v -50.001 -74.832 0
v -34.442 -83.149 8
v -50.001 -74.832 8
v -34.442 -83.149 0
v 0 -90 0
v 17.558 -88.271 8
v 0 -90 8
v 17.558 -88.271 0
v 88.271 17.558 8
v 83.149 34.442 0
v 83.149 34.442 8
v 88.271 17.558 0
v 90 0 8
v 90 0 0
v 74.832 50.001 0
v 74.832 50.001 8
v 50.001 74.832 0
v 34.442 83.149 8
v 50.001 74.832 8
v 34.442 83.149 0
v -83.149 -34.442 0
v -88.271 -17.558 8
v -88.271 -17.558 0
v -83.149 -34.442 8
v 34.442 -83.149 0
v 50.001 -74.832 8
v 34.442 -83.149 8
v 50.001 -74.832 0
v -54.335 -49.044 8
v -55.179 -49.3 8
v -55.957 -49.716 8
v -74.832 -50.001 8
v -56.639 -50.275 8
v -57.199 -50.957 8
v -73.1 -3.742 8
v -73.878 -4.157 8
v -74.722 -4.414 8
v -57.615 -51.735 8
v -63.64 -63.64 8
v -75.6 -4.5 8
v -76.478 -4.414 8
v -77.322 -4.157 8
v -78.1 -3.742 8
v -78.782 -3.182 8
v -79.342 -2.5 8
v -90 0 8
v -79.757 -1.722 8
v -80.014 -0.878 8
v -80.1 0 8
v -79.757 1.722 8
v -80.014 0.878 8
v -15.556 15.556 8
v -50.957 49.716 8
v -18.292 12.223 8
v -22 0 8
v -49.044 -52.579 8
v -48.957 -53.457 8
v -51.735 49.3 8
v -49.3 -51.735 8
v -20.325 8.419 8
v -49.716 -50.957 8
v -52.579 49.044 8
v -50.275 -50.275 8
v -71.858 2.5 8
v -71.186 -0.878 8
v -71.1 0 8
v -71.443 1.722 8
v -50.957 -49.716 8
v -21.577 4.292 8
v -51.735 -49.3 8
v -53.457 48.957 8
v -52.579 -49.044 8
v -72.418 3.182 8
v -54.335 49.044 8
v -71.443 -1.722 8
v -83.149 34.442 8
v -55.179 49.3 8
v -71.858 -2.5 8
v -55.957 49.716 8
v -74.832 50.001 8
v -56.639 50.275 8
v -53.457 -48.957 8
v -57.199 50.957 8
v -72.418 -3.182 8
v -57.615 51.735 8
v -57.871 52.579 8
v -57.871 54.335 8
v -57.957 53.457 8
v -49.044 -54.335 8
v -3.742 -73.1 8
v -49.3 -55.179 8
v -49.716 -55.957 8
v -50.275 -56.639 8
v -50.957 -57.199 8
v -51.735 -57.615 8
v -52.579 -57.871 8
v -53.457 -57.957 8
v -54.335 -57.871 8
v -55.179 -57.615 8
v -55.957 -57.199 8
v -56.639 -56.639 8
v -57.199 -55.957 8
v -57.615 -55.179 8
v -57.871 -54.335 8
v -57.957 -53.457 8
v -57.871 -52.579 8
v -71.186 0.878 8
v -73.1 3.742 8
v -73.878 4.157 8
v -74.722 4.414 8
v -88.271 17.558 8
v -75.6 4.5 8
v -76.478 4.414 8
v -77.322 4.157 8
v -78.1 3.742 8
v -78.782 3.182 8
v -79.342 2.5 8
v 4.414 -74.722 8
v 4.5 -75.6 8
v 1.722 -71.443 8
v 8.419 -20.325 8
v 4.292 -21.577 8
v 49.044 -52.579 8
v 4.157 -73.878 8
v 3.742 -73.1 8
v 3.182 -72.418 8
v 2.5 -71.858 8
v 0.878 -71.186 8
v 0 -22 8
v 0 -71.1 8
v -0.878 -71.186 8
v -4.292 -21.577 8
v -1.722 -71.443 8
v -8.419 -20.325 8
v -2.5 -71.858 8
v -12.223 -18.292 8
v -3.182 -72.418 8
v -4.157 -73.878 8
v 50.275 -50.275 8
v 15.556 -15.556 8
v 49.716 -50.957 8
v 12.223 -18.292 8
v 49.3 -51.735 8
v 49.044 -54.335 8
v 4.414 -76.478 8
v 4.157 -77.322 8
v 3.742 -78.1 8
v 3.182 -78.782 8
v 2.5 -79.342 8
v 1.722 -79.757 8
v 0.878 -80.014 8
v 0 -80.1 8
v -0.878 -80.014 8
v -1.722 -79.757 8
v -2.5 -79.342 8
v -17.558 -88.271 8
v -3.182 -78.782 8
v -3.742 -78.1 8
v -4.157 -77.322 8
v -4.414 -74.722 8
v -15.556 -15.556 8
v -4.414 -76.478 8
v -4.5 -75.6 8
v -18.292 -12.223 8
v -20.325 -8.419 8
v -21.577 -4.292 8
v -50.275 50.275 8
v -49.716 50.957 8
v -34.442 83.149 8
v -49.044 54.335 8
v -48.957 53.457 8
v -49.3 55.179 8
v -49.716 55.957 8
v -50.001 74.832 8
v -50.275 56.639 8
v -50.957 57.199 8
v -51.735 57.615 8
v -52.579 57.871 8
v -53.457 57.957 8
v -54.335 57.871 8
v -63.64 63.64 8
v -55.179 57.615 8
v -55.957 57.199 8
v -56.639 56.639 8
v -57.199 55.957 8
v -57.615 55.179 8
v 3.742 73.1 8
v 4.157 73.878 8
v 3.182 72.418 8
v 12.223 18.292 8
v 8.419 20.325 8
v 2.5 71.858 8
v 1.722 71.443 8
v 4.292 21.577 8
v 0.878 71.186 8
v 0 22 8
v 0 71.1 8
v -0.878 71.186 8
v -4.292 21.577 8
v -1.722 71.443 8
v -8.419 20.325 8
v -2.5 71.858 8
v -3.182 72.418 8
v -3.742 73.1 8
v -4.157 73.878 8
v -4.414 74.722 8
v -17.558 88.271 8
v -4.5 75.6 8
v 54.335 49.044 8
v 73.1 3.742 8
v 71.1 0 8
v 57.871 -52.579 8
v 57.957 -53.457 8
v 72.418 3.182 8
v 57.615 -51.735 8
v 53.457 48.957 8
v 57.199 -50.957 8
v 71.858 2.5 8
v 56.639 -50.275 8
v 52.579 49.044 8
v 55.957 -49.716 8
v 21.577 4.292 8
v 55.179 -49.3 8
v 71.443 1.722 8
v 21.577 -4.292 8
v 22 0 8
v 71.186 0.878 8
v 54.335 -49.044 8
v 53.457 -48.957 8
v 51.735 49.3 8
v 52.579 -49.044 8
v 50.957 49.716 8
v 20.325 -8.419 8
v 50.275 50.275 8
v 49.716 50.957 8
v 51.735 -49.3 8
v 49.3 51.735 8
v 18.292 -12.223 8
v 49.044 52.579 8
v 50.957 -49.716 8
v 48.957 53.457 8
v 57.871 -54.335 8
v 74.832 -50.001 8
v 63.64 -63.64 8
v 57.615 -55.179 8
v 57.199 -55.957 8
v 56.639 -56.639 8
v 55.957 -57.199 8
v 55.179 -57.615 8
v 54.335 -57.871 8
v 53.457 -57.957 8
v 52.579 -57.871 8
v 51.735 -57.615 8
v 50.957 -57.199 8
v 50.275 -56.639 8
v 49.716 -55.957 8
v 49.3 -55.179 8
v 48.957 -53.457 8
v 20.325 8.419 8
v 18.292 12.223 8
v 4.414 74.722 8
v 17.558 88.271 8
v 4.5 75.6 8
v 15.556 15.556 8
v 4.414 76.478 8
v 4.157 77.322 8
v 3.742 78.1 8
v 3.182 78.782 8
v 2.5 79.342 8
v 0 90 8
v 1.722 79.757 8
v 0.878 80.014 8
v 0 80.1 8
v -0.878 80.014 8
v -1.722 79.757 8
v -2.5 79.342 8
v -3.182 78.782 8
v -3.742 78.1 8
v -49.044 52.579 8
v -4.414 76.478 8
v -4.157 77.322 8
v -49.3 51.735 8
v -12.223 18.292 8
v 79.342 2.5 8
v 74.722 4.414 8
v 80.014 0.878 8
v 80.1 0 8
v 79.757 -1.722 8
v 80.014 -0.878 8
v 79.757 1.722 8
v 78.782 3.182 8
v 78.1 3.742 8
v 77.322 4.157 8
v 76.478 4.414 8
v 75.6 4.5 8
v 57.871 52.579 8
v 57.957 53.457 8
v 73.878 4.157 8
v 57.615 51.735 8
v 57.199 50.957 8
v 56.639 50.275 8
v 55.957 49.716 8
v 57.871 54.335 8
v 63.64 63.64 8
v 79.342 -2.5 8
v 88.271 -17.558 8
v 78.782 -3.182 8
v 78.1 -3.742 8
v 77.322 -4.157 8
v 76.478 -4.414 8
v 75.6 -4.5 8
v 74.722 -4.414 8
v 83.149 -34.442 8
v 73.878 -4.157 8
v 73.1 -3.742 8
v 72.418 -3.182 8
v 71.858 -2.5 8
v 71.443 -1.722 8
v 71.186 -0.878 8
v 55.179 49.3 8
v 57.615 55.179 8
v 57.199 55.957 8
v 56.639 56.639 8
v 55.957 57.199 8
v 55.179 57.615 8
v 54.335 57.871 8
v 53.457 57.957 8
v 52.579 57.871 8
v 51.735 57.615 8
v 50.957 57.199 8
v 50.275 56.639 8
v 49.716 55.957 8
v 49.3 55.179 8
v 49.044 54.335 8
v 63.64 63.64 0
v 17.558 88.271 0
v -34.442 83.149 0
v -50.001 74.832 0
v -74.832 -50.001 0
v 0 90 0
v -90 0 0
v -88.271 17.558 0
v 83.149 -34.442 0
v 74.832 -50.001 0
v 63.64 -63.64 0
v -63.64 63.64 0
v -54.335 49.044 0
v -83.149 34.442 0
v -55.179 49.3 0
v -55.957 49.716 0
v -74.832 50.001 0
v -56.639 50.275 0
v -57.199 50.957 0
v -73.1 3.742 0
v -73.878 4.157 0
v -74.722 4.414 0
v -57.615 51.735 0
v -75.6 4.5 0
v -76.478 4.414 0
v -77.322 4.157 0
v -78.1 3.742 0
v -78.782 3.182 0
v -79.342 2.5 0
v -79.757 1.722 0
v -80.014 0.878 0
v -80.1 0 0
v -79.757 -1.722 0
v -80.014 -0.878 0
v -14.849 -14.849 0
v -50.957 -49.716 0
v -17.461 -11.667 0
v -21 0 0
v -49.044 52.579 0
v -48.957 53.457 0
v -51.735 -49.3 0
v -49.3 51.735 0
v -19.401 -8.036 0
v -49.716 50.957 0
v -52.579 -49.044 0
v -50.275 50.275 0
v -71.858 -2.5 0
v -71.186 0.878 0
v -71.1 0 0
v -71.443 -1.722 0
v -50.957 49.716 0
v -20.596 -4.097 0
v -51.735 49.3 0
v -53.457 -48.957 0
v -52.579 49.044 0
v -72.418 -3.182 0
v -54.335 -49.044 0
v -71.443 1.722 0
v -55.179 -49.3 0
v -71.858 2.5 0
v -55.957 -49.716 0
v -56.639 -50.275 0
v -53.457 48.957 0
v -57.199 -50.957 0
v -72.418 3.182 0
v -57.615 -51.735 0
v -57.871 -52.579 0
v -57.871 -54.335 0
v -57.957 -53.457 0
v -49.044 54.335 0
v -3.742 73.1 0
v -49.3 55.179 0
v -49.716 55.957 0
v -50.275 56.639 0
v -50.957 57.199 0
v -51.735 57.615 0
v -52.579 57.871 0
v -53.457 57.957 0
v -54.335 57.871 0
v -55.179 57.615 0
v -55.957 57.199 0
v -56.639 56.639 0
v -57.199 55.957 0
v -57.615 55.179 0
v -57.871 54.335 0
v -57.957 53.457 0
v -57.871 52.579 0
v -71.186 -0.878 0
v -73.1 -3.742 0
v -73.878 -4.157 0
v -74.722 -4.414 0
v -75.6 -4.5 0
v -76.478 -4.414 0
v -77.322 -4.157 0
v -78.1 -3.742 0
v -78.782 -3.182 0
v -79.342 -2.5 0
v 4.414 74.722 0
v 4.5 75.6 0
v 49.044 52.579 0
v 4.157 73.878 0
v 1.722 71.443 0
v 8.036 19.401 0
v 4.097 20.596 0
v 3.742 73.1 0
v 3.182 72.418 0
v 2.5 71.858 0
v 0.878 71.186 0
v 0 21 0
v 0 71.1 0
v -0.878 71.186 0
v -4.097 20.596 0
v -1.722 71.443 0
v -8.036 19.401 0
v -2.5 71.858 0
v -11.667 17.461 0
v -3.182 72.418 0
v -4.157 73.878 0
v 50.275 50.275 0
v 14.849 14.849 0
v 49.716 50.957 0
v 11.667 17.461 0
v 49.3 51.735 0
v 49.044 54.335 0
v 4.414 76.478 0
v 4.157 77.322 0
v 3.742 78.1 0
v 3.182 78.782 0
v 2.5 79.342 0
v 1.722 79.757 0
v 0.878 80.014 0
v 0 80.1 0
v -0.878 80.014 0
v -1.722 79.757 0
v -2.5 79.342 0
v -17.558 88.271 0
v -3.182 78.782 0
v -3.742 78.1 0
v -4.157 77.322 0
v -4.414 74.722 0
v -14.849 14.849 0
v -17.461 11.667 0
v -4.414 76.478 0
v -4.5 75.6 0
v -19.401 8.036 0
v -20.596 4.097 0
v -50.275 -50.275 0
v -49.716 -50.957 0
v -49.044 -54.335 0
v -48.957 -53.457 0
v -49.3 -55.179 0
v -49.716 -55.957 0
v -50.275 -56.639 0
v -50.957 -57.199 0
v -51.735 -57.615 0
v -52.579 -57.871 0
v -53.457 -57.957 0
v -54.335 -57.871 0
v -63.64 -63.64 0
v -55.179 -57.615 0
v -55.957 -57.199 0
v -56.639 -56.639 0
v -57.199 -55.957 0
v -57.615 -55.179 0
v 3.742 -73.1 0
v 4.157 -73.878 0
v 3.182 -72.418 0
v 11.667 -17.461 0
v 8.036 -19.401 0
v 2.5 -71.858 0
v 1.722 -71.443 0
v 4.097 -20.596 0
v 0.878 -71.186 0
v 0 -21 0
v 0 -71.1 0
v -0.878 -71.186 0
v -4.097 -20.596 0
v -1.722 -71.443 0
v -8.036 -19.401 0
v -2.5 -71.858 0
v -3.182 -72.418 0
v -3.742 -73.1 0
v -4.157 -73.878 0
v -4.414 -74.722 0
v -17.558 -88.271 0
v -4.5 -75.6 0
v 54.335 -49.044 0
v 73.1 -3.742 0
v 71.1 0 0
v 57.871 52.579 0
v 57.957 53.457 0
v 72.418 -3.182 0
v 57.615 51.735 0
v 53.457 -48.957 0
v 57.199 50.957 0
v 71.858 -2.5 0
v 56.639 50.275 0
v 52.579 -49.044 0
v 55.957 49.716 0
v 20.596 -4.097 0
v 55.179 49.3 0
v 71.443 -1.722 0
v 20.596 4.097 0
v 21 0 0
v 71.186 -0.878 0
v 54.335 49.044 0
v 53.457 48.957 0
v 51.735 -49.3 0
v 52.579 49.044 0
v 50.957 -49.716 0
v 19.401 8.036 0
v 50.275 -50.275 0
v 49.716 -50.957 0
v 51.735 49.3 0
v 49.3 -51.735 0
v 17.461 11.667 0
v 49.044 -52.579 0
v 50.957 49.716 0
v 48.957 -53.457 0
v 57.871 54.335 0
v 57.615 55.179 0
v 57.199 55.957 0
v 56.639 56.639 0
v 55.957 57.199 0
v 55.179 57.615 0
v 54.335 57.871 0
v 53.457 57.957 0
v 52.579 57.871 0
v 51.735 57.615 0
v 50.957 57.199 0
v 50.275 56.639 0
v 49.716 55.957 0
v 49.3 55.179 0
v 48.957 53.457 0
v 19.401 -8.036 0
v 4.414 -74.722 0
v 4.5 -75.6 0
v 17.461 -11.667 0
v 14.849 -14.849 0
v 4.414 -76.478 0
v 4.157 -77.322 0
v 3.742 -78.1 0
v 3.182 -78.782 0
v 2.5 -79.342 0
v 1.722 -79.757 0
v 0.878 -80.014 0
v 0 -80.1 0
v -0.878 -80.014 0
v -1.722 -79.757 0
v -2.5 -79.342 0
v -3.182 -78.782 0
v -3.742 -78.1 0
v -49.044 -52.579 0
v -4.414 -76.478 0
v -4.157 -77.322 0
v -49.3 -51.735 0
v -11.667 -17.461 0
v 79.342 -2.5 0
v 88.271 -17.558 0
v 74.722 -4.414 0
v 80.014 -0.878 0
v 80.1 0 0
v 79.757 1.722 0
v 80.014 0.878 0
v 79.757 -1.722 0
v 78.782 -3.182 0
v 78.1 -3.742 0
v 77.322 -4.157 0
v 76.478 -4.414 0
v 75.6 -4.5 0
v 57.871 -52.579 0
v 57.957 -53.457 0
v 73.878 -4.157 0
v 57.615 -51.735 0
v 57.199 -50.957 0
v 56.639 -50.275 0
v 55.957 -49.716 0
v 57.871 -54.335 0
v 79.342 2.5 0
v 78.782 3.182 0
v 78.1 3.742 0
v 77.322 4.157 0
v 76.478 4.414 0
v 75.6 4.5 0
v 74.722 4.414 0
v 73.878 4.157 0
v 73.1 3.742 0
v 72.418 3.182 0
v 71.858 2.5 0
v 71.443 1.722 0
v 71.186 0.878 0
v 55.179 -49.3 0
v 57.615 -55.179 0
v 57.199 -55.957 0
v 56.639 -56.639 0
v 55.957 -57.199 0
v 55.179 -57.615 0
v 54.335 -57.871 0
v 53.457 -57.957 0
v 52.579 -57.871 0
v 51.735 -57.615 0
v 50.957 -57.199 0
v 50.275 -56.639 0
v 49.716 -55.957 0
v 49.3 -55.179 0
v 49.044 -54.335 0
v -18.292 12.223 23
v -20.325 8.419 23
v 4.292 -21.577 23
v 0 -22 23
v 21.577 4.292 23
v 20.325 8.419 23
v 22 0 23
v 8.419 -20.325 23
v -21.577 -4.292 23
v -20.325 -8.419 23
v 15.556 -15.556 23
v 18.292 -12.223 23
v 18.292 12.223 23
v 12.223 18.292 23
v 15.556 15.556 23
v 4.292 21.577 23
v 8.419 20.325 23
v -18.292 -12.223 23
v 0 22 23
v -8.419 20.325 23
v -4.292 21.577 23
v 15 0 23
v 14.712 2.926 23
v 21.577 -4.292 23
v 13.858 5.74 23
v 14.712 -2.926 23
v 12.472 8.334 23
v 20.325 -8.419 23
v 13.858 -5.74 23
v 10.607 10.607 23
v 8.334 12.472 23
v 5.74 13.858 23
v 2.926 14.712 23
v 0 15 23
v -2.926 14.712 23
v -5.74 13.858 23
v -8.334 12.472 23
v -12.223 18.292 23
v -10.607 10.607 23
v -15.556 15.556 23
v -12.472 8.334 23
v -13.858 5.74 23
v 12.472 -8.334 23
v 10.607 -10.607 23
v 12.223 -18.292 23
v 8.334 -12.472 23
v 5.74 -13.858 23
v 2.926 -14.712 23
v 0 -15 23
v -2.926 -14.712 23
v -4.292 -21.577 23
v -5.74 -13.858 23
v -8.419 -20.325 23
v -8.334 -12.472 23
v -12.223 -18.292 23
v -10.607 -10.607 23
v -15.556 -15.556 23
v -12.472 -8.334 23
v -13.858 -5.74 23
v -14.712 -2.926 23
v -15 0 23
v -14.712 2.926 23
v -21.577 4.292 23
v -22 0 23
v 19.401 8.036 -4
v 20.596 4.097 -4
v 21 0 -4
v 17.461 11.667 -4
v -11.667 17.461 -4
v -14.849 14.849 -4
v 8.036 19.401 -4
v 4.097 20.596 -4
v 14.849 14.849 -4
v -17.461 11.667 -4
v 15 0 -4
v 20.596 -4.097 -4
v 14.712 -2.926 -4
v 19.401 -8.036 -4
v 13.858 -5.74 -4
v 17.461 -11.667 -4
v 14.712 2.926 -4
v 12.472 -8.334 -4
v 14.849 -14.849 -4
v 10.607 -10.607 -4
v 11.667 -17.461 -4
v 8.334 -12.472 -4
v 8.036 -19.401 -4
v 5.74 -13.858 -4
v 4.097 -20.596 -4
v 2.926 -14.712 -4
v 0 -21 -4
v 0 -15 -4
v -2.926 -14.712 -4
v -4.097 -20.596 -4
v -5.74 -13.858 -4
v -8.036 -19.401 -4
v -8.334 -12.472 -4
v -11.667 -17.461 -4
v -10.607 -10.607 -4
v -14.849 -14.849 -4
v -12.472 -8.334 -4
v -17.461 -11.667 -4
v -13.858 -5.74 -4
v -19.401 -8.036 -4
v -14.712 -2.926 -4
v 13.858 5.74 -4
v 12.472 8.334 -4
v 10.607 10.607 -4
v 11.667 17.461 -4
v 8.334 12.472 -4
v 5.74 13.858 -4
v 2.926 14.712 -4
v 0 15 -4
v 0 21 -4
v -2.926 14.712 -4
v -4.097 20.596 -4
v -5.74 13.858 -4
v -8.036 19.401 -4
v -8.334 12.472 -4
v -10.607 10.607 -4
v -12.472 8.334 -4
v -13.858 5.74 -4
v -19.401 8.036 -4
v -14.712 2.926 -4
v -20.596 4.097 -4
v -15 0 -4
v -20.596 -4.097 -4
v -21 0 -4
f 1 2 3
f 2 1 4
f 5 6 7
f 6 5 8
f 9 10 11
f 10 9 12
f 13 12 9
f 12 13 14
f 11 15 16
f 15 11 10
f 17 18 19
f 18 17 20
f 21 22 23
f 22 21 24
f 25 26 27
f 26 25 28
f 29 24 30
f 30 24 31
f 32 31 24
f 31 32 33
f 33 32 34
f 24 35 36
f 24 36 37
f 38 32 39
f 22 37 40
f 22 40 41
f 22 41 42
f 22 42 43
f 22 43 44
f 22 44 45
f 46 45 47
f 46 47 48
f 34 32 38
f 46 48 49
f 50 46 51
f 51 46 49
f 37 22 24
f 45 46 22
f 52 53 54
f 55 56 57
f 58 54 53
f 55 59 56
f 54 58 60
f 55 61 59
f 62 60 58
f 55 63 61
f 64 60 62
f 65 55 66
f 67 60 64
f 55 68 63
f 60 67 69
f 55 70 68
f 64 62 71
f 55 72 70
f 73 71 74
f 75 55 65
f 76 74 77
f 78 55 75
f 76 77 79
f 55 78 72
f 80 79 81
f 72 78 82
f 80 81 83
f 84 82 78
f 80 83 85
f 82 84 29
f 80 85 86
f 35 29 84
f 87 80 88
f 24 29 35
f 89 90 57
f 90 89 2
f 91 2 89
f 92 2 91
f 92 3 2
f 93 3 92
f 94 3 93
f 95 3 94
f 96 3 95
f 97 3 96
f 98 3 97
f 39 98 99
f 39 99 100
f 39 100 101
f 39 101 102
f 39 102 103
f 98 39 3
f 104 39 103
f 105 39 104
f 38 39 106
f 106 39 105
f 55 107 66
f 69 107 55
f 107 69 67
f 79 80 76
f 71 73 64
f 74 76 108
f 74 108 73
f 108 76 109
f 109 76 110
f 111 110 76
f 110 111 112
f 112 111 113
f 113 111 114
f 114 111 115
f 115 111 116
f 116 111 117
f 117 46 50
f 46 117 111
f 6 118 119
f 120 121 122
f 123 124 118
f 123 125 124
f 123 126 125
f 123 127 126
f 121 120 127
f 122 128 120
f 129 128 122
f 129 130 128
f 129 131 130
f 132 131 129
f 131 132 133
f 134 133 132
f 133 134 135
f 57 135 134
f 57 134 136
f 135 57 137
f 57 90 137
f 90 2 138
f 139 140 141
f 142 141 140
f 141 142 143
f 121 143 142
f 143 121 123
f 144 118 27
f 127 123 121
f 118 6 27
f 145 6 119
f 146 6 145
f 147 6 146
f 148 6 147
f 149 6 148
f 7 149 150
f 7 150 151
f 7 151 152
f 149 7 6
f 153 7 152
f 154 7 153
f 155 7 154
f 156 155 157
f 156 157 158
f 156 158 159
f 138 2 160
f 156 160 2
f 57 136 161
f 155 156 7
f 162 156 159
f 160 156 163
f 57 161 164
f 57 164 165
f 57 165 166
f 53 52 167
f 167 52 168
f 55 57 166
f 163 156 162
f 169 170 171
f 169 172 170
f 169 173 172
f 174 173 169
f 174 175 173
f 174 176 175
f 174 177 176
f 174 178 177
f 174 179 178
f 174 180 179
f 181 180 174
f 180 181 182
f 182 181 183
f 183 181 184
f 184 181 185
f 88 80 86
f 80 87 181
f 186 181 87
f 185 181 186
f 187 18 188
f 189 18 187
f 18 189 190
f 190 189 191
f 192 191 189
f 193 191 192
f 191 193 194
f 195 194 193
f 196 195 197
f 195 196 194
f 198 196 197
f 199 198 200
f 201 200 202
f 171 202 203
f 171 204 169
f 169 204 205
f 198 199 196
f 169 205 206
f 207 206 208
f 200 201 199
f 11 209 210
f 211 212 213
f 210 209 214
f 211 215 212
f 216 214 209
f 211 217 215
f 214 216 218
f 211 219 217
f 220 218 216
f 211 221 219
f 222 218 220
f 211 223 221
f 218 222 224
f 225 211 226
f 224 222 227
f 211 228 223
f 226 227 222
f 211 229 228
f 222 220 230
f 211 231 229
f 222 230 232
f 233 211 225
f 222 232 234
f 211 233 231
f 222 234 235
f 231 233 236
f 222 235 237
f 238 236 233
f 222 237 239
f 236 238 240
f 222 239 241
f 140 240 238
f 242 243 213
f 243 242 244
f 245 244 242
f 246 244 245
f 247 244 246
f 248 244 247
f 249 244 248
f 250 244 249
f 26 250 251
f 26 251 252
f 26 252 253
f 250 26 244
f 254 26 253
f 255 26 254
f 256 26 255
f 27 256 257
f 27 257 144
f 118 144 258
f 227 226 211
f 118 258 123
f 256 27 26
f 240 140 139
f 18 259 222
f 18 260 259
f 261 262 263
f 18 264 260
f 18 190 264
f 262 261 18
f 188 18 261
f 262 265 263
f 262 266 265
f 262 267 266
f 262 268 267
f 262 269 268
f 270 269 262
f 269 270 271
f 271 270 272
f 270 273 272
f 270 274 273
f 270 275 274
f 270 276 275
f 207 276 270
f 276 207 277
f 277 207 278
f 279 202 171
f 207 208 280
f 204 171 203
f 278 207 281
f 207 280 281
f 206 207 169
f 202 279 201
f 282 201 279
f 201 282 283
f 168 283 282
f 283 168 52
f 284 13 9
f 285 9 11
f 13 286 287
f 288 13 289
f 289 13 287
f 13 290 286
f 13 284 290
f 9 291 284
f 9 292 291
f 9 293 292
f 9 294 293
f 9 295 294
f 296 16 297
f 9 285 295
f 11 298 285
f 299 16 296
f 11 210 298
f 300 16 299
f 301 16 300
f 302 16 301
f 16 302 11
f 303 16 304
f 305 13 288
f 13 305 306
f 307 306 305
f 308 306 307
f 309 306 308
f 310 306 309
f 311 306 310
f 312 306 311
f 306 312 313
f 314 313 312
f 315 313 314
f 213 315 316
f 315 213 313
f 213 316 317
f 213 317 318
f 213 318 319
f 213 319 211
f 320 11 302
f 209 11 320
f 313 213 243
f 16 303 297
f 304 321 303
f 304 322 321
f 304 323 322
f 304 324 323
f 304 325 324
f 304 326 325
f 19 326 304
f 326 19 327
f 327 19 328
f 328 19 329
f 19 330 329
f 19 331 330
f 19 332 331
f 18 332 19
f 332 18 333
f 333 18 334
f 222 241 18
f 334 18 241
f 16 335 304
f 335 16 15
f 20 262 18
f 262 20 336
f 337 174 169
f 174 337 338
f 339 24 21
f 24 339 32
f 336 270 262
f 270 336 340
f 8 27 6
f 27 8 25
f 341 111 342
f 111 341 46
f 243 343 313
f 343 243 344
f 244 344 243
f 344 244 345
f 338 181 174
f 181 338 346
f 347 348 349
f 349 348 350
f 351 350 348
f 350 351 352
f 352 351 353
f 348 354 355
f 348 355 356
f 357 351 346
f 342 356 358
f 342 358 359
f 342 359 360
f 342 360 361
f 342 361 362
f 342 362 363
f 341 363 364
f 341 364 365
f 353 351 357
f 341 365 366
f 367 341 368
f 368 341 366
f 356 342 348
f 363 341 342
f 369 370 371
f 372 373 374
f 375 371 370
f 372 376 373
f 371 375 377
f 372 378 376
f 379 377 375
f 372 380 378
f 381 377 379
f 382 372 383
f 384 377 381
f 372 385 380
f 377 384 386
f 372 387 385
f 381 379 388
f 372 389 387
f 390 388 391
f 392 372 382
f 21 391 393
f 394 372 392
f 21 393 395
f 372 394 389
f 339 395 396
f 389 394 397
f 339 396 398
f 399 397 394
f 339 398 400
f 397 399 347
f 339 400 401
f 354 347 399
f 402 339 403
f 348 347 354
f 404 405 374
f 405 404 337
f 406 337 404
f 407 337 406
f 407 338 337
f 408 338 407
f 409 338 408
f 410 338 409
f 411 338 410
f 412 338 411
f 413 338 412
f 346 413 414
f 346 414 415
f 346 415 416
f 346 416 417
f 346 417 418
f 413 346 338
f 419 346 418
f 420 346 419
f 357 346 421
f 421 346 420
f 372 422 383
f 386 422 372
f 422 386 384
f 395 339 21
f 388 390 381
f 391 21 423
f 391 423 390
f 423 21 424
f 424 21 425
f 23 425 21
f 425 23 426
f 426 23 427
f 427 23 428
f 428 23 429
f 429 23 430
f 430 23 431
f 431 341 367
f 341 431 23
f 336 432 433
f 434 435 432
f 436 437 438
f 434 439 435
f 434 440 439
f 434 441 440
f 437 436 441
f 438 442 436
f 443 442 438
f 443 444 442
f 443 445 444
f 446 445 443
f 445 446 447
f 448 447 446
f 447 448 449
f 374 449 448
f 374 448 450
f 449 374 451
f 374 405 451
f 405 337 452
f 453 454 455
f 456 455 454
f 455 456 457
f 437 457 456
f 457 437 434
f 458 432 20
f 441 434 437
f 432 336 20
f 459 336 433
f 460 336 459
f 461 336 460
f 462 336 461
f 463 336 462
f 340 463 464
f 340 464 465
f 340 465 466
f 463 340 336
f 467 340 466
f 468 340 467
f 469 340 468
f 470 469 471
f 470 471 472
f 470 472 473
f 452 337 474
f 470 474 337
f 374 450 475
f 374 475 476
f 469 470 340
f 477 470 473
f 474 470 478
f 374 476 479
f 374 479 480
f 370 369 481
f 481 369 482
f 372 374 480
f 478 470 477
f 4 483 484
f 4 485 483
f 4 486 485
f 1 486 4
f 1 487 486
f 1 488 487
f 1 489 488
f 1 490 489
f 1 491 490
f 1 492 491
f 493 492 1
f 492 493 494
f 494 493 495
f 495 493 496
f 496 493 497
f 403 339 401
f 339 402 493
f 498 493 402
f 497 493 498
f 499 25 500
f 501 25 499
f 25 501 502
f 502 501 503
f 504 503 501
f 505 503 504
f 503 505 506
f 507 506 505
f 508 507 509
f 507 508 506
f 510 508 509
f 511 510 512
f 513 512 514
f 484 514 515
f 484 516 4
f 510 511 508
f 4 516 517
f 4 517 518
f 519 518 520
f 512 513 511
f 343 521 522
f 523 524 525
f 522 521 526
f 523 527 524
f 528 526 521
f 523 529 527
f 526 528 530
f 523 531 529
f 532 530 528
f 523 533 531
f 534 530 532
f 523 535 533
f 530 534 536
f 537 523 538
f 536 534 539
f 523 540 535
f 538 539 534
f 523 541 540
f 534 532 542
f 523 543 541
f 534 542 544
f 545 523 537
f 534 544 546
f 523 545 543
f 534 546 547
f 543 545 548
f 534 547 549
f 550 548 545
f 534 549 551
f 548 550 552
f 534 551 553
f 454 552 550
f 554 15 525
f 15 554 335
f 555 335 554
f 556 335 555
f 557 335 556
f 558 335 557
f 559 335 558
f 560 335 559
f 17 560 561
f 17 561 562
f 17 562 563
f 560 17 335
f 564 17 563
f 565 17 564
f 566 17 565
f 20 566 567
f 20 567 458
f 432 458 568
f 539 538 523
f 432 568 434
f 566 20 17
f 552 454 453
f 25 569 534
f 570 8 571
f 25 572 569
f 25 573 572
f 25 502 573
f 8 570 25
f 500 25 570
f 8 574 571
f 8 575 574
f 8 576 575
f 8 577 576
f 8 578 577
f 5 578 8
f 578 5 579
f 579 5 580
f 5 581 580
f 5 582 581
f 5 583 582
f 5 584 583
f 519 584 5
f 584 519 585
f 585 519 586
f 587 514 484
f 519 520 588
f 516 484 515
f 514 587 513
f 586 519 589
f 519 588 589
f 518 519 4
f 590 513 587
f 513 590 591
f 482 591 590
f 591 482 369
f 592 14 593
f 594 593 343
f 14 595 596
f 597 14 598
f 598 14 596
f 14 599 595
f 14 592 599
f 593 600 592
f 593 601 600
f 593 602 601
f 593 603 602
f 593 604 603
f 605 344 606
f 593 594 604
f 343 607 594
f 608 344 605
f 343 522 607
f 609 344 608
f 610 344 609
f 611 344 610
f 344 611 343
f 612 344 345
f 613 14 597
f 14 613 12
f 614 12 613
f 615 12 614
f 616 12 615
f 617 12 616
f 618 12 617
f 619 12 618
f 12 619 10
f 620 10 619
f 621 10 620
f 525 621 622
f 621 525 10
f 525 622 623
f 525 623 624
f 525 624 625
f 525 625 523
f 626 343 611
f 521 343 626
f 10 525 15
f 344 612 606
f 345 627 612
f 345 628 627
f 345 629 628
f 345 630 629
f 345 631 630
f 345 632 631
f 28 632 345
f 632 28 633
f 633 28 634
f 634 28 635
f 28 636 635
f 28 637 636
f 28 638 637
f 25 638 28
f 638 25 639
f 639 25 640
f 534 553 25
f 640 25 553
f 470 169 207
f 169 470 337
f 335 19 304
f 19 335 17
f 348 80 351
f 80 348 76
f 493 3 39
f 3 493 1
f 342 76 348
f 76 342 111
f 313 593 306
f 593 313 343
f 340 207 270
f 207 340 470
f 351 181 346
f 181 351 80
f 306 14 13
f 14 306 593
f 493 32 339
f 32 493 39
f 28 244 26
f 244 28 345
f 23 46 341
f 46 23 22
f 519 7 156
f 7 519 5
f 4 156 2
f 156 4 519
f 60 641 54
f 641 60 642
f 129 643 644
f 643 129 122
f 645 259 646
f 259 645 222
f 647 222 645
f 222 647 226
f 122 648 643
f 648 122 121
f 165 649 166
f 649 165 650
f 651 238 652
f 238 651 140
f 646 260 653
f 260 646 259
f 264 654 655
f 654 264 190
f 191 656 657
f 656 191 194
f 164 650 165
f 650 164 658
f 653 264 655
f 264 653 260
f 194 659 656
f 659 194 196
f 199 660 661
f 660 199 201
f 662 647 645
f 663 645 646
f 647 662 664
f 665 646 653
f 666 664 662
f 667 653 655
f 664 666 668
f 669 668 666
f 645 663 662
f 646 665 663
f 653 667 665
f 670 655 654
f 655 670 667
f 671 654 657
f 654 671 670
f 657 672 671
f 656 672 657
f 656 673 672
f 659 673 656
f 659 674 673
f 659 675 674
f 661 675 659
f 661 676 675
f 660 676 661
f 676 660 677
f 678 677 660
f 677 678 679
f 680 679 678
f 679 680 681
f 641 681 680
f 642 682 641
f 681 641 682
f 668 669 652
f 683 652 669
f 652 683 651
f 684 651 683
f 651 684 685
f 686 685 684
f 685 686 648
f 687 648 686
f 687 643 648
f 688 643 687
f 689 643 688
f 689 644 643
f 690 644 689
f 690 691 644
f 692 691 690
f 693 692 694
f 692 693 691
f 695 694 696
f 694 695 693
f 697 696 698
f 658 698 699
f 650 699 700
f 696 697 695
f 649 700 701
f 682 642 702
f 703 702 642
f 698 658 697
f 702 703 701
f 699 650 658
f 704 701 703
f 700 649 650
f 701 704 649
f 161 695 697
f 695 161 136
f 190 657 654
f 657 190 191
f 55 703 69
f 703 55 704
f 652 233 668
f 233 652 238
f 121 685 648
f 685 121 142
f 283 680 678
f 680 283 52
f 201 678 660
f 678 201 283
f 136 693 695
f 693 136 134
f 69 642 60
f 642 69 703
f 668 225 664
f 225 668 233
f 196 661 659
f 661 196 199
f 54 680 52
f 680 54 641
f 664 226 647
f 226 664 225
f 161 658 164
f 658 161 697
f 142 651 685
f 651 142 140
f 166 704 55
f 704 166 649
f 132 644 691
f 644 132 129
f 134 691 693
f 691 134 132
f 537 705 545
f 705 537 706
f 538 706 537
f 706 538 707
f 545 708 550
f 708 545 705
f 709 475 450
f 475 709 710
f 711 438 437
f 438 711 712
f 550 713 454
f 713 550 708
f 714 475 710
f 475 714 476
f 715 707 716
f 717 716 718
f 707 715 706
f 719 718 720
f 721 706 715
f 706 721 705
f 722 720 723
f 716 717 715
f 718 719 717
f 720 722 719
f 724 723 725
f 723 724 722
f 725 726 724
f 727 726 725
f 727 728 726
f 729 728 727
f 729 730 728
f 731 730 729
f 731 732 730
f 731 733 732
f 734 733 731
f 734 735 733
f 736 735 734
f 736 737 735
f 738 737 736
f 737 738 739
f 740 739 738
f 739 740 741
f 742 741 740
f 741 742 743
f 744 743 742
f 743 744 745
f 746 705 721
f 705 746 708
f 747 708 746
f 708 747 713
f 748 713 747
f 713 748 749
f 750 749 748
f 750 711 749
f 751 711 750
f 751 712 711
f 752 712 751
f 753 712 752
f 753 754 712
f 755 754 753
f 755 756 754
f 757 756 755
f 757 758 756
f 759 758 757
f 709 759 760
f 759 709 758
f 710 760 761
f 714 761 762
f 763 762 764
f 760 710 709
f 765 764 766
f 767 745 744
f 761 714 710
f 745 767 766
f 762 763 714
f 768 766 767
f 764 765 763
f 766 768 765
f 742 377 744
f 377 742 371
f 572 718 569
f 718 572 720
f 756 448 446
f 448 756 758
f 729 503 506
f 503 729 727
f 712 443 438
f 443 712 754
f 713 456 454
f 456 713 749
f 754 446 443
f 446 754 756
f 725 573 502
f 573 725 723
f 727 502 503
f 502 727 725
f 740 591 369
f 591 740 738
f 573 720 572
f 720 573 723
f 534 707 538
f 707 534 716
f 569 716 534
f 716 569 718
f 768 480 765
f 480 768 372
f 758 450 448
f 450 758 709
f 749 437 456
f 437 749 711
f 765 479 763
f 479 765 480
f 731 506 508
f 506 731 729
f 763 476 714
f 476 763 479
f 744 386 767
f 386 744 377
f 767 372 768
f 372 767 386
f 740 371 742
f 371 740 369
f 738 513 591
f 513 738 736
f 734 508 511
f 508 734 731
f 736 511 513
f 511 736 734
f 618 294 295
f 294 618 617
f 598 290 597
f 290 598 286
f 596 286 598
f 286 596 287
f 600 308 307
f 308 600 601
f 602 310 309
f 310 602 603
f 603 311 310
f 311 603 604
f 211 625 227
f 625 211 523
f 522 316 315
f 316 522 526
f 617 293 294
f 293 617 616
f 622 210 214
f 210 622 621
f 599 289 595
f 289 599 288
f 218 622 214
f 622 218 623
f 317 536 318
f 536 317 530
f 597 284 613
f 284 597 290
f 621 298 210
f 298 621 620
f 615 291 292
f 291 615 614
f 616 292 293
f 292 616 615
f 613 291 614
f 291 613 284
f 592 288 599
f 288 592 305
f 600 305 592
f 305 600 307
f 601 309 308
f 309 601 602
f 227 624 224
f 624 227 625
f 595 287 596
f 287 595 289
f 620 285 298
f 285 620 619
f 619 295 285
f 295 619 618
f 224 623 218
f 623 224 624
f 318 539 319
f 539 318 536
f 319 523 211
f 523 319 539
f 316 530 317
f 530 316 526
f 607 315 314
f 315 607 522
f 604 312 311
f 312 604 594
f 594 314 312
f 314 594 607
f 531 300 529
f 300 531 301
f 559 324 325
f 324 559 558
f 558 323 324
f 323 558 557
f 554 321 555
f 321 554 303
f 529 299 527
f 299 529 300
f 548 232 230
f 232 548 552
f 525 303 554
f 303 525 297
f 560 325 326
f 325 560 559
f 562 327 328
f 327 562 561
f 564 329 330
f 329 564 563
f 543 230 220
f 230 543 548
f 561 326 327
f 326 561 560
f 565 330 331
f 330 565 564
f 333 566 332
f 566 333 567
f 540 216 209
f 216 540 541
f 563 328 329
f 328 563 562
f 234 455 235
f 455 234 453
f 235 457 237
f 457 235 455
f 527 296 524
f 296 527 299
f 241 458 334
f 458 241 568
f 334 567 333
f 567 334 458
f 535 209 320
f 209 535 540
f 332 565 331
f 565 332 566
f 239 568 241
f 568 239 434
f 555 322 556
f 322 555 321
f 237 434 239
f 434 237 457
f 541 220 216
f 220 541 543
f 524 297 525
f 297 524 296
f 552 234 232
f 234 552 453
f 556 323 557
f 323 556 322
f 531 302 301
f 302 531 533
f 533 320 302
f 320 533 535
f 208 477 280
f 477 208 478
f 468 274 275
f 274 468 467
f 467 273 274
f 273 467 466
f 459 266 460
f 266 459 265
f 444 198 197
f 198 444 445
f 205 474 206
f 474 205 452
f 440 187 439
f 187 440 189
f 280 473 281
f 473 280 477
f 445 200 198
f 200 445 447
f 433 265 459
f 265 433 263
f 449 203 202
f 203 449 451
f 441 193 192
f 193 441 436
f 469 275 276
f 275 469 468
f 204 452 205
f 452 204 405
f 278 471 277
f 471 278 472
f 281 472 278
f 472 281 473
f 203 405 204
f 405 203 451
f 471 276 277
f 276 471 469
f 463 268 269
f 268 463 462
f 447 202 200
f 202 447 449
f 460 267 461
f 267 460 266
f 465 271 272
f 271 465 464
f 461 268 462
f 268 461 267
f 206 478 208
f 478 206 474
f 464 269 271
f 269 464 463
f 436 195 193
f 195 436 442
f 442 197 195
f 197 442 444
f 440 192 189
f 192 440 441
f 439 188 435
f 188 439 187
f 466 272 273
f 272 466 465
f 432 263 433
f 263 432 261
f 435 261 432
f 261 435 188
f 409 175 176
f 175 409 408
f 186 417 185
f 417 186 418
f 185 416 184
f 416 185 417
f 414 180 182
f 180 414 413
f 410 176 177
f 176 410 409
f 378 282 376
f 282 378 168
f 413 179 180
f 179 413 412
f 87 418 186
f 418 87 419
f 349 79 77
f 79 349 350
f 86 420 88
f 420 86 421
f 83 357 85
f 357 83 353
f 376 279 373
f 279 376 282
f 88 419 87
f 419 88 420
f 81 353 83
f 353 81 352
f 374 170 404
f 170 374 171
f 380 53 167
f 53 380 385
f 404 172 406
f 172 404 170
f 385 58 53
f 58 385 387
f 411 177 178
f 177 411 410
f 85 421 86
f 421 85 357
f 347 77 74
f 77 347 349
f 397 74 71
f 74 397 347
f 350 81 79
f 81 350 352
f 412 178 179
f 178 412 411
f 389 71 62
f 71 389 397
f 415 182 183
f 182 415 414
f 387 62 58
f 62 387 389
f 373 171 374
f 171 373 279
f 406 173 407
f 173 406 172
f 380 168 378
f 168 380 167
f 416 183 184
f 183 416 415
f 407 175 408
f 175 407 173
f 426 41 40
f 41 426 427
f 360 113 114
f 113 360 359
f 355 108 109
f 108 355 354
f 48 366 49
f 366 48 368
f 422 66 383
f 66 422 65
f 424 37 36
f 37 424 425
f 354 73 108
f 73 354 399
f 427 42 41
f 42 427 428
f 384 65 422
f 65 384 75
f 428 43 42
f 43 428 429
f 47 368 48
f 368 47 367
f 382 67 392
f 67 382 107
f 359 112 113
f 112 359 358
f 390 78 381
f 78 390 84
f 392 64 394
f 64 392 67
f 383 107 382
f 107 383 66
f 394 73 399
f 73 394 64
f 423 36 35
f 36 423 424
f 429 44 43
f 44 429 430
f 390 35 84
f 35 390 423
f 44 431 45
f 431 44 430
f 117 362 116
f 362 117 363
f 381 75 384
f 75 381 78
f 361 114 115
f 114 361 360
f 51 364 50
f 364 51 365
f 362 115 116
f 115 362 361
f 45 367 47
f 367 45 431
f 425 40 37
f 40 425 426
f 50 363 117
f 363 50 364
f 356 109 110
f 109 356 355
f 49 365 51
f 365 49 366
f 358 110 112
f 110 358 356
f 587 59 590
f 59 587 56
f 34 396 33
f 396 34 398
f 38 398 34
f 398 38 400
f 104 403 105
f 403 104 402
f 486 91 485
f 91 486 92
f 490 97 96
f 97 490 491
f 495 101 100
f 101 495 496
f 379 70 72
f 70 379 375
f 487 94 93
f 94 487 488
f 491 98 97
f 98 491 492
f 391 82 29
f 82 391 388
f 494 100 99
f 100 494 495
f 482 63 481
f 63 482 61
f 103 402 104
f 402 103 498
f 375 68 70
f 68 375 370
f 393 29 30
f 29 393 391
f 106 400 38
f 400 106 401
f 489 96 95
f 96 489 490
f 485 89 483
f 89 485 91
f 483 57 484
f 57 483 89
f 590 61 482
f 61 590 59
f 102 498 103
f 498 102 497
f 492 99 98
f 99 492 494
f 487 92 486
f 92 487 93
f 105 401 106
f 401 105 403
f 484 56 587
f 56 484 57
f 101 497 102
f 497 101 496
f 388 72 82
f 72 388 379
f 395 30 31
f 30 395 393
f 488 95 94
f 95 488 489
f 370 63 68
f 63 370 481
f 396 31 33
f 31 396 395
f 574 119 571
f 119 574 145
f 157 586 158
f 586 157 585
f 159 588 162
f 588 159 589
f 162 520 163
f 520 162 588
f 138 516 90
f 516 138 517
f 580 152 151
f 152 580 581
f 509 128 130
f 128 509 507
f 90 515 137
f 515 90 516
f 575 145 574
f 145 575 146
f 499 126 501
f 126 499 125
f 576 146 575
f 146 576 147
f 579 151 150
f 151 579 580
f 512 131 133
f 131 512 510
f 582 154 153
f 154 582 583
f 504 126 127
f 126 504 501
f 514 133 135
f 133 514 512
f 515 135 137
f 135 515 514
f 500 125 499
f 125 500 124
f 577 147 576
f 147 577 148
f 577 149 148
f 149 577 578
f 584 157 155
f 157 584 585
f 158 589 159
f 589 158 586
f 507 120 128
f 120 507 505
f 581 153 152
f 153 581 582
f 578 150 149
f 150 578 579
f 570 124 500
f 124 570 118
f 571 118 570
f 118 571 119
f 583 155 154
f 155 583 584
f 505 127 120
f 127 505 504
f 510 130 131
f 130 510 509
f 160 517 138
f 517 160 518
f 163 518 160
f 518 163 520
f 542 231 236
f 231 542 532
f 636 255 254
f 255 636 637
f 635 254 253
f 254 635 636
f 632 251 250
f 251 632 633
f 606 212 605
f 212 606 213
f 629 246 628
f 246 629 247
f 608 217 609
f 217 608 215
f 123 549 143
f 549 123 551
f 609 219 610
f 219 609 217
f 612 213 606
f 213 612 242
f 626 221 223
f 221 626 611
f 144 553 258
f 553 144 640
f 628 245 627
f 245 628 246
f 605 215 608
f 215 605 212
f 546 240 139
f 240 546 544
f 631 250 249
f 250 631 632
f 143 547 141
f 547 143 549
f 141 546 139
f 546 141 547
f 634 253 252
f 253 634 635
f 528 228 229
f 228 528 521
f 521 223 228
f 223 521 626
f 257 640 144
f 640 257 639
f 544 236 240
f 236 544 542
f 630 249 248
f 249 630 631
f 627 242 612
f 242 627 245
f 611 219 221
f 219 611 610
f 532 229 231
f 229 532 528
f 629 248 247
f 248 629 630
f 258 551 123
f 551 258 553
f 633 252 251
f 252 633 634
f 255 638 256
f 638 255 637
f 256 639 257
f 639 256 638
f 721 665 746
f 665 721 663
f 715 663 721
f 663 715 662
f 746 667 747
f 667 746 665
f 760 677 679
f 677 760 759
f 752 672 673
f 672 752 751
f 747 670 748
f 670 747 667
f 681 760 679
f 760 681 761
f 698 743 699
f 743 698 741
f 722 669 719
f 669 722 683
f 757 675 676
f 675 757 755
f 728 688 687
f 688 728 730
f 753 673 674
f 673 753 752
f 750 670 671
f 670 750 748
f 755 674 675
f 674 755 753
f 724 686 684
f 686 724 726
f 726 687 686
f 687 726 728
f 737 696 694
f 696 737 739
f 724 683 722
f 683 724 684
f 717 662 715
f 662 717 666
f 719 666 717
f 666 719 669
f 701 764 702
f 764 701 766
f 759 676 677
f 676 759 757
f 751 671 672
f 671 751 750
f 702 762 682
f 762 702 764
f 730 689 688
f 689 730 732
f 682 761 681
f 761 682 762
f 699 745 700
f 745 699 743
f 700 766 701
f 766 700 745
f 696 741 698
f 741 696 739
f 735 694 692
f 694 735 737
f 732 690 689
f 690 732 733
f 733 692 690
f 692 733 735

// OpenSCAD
$fn = 32;

// ----------------------------------------------------------------------
// Bolt-circle flange: 180 mm outside, 8 bolt holes, bore 30 mm
// ----------------------------------------------------------------------

// --- parameters (mm) ---
flange_d = 180;           // flange outside diameter
flange_t = 8;             // flange thickness
bolts = 8;                // number of bolt holes
bolt_d = 9;               // bolt clearance
bolt_r = 75.6;            // bolt circle radius
bore_d = 30;              // centre bore
hub_d = 44;               // raised hub diameter
hub_h = 15;               // raised hub height
spigot_d = 42;            // spigot diameter
spigot_h = 5;             // spigot height below the flange
sink = 1;                 // overlap into the flange

module body() {
  cylinder(h = flange_t, d = flange_d);
  /* raised hub, sunk 1 mm into the flange */
  translate([0, 0, flange_t - 1]) cylinder(h = hub_h + 1, d = hub_d);
  /* spigot on the back face, sunk into the flange */
  translate([0, 0, -spigot_h + sink]) cylinder(h = spigot_h, d = spigot_d);
}

difference() {
  body();
  /* bolt circle */
  for (i = [0 : bolts - 1]) rotate([0, 0, i * 360 / bolts]) translate([bolt_r, 0, -spigot_h - 1]) cylinder(h = flange_t + hub_h + spigot_h + 3, d = bolt_d);
  translate([0, 0, -spigot_h - 1]) cylinder(h = flange_t + hub_h + spigot_h + 3, d = bore_d);
}
